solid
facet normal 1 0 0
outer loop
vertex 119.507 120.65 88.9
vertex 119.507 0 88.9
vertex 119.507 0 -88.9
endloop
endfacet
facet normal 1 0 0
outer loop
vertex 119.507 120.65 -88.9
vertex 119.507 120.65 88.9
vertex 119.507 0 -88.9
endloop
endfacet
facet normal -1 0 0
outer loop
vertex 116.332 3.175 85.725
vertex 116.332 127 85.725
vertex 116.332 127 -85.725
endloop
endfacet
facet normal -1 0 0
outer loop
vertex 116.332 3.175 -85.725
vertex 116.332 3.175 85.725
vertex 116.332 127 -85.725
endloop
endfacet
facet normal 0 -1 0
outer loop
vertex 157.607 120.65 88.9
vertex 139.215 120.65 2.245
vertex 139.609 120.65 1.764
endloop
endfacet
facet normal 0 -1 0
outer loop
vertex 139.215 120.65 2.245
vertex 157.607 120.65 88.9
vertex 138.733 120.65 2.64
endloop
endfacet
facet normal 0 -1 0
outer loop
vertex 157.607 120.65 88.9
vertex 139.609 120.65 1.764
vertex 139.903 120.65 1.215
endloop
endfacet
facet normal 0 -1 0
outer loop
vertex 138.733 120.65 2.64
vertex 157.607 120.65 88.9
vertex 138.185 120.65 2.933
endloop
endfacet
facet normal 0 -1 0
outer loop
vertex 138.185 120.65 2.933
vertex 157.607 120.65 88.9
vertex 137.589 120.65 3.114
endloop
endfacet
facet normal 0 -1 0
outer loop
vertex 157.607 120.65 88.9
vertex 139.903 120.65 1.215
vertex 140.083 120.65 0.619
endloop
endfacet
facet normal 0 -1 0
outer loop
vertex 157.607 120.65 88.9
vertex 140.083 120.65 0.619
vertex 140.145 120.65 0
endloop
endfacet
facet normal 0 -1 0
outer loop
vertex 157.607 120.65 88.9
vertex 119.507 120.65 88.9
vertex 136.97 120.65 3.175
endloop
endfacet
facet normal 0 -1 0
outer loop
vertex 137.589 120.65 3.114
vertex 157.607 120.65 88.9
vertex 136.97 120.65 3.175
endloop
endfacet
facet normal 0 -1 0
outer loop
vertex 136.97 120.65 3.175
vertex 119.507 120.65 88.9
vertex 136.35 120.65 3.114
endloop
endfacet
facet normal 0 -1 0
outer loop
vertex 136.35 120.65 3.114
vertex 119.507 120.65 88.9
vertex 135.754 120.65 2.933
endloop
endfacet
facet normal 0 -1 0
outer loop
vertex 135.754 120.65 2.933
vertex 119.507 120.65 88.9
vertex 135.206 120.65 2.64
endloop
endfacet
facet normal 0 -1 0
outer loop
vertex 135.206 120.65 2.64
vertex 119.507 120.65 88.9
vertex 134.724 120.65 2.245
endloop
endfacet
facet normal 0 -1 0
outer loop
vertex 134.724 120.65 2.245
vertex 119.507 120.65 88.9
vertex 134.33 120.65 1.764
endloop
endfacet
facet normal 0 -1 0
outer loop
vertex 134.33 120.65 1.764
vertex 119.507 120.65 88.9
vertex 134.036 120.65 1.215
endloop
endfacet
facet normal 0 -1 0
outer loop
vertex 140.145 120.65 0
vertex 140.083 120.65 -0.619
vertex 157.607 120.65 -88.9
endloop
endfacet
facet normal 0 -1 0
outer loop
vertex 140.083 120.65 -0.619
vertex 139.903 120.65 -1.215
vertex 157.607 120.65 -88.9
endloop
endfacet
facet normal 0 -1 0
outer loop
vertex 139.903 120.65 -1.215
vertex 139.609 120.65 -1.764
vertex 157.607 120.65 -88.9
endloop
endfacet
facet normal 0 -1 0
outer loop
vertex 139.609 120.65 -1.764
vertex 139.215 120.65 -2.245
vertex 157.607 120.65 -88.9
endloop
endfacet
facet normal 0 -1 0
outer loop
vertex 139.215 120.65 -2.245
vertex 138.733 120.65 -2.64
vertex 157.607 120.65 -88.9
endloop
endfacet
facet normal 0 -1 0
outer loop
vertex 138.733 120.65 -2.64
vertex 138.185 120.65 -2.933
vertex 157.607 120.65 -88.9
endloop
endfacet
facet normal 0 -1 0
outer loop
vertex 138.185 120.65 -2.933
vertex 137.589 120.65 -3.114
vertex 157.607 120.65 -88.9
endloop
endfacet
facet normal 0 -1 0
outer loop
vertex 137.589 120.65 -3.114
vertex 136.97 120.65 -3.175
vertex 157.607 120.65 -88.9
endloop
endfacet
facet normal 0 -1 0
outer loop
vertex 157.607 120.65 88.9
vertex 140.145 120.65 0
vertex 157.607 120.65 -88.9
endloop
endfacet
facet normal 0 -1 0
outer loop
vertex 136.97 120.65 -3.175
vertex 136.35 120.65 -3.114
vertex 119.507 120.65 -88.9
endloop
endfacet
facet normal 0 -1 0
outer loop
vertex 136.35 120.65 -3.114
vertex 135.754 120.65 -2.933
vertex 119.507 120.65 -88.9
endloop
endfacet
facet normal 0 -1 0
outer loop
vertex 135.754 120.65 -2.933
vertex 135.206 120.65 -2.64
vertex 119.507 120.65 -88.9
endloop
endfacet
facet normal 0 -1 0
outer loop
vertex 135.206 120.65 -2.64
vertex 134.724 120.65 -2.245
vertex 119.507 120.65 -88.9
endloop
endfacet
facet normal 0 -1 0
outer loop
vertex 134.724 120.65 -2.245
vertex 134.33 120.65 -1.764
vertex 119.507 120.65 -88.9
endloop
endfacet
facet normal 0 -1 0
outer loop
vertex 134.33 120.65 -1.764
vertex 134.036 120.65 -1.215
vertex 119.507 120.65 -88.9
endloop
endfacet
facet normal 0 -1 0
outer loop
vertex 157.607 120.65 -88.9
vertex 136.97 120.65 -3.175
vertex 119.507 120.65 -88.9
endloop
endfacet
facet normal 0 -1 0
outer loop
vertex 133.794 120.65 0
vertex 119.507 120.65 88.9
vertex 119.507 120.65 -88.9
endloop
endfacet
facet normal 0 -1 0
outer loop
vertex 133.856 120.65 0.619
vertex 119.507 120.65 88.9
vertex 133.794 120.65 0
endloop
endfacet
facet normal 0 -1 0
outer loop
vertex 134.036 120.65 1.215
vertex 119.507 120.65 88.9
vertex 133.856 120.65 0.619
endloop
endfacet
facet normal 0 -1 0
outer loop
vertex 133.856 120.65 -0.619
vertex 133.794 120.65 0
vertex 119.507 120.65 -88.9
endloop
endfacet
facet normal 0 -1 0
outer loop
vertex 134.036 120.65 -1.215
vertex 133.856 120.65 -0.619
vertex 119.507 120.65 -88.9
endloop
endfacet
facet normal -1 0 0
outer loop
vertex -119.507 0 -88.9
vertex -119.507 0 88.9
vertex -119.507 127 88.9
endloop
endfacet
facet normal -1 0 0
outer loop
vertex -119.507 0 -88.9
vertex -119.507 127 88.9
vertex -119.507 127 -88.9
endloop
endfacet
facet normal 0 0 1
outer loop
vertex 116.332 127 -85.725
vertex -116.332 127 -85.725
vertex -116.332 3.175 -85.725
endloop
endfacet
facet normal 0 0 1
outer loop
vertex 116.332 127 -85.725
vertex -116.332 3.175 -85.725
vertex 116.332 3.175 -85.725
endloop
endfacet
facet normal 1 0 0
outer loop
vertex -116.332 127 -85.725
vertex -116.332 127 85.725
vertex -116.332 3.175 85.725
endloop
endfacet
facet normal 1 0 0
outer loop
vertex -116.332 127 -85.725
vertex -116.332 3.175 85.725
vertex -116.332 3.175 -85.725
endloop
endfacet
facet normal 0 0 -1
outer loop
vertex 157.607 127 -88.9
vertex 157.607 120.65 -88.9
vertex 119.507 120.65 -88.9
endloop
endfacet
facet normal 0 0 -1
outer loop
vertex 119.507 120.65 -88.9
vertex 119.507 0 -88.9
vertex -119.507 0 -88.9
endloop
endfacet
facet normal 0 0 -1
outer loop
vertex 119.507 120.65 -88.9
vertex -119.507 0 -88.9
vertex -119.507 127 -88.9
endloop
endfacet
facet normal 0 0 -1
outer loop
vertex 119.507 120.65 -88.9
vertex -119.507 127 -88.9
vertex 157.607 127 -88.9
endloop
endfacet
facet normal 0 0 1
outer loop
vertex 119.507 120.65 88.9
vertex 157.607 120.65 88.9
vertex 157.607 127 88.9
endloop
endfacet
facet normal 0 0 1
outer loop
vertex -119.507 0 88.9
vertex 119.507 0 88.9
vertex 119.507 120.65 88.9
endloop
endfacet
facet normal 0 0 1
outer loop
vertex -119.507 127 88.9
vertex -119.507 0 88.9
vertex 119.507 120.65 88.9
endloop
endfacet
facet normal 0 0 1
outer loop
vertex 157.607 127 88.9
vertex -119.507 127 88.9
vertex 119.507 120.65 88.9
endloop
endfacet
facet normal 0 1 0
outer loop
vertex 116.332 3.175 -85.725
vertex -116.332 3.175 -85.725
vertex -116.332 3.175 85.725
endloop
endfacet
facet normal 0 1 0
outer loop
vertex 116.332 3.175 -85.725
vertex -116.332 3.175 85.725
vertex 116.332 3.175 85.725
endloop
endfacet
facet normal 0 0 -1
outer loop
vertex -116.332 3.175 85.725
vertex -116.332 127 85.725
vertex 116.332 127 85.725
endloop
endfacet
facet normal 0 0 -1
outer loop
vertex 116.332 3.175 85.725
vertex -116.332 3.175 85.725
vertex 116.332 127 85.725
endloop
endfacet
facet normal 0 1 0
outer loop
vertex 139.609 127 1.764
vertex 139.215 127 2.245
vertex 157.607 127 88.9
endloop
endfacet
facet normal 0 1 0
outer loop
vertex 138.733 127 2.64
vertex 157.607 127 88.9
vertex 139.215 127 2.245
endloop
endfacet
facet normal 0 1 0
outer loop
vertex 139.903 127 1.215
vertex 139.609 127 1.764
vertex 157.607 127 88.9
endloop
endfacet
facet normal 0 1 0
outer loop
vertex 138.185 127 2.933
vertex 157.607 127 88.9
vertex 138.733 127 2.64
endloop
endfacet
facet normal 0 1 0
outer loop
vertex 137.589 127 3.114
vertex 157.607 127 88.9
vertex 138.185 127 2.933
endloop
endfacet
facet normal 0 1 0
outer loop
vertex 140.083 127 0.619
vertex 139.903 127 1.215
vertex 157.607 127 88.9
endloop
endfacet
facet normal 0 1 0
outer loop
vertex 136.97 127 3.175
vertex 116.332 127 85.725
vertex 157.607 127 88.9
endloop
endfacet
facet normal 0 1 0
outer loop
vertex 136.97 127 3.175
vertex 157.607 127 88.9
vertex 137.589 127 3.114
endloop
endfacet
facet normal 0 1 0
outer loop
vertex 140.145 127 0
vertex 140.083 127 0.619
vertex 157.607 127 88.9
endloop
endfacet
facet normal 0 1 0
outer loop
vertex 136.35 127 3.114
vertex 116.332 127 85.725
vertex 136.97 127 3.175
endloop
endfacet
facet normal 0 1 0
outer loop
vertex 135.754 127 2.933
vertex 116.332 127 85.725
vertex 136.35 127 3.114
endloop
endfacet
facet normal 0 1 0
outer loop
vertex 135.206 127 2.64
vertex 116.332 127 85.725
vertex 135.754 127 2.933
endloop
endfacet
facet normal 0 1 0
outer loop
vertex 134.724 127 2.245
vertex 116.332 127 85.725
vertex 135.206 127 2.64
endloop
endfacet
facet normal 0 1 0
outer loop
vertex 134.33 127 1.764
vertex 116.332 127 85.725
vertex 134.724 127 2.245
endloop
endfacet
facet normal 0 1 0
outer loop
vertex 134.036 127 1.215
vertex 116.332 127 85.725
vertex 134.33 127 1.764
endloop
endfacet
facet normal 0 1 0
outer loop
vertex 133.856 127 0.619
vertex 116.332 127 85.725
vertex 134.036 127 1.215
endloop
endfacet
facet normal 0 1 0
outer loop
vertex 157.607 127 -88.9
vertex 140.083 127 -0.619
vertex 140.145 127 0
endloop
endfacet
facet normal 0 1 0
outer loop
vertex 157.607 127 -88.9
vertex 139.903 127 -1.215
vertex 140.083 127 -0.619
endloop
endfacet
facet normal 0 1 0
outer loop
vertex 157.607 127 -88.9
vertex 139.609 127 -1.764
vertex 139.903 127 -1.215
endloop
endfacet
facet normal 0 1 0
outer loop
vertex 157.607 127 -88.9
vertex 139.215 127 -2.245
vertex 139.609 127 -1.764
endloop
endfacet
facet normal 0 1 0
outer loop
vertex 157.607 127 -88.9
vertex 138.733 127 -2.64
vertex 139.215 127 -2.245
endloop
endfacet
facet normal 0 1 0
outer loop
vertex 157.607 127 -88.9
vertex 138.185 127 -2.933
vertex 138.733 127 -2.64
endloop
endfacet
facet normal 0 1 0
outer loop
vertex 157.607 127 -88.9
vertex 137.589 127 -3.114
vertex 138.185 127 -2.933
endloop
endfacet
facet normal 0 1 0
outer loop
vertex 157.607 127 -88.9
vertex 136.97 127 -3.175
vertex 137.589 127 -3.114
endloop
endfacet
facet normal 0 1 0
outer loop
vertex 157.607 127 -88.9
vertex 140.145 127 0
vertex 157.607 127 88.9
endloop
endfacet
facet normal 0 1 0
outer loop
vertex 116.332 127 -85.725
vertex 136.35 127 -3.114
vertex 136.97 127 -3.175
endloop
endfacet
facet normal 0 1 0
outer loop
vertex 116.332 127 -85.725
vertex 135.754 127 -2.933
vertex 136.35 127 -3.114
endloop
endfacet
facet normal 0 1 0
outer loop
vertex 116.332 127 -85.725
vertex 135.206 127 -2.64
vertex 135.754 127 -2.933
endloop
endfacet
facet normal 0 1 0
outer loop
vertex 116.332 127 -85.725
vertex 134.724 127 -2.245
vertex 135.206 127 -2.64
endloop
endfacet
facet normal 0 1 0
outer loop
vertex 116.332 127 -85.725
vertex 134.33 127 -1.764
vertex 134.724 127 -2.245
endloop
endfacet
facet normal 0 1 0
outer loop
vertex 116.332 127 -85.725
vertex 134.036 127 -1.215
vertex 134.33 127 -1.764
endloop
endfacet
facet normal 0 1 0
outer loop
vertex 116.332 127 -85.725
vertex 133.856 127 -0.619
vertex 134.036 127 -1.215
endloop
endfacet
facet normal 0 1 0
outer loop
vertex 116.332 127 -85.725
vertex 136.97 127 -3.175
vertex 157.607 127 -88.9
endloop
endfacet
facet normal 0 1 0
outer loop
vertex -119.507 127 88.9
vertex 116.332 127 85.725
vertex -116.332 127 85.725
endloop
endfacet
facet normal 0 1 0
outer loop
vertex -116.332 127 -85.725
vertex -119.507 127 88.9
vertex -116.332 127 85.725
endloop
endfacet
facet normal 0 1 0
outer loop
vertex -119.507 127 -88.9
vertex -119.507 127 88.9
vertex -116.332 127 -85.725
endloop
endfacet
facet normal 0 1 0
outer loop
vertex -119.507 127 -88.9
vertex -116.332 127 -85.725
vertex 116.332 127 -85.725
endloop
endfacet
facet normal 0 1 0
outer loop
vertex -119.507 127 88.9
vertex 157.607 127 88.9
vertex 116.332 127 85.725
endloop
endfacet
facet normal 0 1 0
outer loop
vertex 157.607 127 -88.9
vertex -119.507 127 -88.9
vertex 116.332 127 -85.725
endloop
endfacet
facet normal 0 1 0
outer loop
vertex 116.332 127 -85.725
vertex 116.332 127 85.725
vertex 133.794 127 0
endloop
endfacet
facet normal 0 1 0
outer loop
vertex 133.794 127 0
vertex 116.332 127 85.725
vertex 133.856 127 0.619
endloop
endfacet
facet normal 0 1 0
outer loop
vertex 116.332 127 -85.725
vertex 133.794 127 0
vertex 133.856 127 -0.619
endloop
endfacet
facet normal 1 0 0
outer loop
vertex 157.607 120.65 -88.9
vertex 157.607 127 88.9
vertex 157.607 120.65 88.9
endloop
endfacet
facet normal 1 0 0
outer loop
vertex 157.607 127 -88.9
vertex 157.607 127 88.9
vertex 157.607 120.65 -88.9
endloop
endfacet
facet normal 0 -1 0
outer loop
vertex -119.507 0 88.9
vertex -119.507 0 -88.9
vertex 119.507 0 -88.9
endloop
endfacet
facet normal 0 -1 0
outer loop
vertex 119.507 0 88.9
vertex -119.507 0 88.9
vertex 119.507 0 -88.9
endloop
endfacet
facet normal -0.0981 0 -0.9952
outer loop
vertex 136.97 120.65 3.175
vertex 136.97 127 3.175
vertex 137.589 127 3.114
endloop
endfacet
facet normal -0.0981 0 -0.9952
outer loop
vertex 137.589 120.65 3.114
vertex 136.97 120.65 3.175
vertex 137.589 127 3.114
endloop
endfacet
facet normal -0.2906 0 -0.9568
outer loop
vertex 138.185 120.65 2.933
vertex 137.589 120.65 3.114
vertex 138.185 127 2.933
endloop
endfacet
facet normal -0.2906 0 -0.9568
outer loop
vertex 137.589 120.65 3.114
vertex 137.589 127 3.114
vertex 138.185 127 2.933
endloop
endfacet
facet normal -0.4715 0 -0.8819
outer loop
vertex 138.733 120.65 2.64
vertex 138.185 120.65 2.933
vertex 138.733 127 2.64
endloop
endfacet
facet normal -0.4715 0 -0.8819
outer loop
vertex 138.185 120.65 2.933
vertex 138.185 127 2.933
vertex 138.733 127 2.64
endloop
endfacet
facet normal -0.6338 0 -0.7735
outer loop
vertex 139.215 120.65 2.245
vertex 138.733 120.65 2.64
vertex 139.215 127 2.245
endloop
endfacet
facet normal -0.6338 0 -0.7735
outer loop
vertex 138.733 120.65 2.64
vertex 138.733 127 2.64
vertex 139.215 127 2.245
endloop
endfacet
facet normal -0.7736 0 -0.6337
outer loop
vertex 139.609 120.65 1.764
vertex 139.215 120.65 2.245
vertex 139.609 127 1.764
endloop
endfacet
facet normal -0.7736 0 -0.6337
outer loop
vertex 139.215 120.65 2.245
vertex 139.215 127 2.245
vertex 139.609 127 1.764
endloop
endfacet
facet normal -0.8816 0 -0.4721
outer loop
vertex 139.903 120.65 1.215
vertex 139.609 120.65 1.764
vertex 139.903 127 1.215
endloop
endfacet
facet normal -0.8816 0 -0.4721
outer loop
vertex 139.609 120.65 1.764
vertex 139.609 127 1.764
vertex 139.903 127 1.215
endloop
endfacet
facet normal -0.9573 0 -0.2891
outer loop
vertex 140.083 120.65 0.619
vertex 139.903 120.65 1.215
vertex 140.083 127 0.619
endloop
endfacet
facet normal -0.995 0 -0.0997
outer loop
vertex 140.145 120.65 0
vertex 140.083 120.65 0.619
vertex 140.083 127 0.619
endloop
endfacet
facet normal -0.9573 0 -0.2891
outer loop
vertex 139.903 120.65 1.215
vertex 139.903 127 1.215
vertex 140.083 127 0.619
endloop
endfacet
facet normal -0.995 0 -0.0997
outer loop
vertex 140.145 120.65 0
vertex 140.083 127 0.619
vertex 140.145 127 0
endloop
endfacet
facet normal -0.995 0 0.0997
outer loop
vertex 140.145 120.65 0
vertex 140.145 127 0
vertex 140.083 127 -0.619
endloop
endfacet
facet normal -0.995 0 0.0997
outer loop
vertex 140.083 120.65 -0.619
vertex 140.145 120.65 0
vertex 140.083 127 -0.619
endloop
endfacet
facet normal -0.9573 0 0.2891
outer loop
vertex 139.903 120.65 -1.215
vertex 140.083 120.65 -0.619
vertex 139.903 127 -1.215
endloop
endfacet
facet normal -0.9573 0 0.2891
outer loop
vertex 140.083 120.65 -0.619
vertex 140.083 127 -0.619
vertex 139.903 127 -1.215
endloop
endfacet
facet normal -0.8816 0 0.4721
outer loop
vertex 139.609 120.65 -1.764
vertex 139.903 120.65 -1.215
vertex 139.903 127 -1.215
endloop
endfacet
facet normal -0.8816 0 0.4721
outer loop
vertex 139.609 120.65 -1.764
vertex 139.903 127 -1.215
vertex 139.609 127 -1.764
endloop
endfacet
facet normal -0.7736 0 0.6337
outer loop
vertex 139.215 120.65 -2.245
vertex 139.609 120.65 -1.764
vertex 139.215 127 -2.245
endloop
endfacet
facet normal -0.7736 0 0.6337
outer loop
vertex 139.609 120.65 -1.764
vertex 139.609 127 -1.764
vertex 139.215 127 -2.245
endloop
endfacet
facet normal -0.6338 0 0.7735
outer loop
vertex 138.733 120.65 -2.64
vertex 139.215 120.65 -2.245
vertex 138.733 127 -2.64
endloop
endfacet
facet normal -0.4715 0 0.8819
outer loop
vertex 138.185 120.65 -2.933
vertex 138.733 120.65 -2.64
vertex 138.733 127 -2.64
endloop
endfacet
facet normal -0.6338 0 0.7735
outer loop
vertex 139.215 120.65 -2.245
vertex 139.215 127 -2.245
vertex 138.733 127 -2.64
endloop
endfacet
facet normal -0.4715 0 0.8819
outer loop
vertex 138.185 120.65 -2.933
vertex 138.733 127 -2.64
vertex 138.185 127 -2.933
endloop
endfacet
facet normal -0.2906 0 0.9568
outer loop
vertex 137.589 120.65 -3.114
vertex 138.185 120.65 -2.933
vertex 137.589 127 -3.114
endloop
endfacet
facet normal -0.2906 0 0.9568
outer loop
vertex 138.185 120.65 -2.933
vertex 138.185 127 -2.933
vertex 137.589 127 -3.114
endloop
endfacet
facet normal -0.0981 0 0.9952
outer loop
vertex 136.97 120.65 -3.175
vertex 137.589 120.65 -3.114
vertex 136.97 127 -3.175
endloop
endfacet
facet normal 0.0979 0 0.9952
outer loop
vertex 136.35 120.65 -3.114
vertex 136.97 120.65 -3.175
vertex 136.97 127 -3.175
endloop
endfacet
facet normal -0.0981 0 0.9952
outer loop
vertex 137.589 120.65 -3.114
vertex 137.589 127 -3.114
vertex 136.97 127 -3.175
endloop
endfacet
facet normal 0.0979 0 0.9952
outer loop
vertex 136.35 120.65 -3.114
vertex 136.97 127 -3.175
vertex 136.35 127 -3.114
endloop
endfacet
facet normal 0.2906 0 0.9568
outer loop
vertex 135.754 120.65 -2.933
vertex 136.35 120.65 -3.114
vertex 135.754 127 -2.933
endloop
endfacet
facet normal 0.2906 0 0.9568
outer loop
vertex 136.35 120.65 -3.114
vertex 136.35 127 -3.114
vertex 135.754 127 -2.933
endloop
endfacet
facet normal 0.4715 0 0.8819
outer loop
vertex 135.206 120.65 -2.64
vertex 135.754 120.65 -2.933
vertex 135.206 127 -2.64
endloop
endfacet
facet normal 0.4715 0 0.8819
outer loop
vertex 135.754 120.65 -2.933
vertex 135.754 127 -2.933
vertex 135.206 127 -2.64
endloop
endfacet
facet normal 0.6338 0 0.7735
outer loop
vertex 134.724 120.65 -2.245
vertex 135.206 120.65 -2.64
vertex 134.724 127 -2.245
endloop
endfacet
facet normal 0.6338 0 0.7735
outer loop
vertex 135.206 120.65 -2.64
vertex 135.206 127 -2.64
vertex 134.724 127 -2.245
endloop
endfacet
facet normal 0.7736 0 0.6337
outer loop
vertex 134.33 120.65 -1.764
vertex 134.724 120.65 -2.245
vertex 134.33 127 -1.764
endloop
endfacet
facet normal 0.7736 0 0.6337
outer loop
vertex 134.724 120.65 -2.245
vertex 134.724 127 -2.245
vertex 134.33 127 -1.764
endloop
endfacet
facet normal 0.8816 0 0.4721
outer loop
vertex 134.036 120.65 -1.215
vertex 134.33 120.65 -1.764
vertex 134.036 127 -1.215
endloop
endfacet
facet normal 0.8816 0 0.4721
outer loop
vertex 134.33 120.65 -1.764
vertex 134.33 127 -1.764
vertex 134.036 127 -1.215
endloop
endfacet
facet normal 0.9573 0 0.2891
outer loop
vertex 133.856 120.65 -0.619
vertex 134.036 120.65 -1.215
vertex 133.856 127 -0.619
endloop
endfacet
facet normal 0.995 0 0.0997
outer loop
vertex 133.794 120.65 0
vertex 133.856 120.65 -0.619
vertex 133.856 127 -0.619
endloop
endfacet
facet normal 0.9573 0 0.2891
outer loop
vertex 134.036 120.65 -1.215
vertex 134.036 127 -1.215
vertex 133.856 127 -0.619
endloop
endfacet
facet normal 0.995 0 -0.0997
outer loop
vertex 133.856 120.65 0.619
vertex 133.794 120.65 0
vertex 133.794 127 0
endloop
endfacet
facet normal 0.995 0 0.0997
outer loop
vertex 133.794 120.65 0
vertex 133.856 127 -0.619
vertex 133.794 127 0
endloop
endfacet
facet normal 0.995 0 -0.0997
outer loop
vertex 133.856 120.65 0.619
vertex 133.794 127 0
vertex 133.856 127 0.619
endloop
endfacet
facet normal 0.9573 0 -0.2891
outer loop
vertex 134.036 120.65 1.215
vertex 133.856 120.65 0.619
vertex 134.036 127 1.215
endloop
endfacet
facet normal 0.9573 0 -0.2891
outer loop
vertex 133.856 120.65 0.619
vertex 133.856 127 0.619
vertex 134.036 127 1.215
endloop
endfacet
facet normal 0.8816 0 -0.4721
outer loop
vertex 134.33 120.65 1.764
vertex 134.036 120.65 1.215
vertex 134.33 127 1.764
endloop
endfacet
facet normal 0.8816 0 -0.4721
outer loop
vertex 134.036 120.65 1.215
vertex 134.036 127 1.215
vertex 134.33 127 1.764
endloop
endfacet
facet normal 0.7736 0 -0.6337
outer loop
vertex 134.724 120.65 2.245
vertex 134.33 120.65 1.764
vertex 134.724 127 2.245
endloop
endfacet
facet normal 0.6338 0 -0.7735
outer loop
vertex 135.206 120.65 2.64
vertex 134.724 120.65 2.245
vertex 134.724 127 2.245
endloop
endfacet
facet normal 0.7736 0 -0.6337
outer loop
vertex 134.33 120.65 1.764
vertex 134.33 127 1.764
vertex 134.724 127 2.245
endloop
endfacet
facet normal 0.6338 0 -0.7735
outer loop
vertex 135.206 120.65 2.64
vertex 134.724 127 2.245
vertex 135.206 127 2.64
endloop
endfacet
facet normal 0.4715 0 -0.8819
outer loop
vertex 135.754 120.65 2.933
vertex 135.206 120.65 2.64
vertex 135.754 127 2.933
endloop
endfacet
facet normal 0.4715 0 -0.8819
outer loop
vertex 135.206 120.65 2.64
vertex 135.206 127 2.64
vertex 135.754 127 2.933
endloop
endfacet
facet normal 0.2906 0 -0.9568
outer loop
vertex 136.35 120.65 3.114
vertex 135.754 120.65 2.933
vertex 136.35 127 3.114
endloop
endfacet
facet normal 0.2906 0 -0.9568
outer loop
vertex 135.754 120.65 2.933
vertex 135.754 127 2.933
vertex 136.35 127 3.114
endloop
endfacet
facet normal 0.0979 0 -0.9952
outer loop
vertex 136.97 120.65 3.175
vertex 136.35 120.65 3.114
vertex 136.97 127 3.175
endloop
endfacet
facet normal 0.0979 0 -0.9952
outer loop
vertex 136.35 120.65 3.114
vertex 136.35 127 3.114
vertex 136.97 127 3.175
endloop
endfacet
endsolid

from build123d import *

# Parameters (mm, degrees)
SKETCH1_W           = 239.014
SKETCH1_H           = 177.8
BOSS_EXTRUDE1_DEPTH = 127
SKETCH2_W           = 232.664
SKETCH2_H           = 171.45
CUT_EXTRUDE1_DEPTH  = 123.825
SKETCH3_W           = 177.8
SKETCH3_H           = 6.35
BOSS_EXTRUDE2_DEPTH = 38.1
SKETCH5_R           = 3.175
CUT_EXTRUDE2_DEPTH  = 6.35


with BuildPart() as part:
    # Sketch1 → Boss-Extrude1 (new body)
    with BuildSketch(Plane(origin=(0, 0, 0), x_dir=(1, 0, 0), z_dir=(0, 1, 0))):
        Rectangle(SKETCH1_W, SKETCH1_H)
    extrude(amount=BOSS_EXTRUDE1_DEPTH)

    # Sketch2 → Cut-Extrude1 (cut)
    with BuildSketch(Plane(origin=(0, 127, 0), x_dir=(1, 0, 0), z_dir=(0, 1, 0))):
        Rectangle(SKETCH2_W, SKETCH2_H)
    extrude(amount=-CUT_EXTRUDE1_DEPTH, mode=Mode.SUBTRACT)

    # Sketch3 → Boss-Extrude2 (add)
    with BuildSketch(Plane(origin=(119.507, 0, 0), x_dir=(0, 0, -1), z_dir=(1, 0, 0))):
        with Locations((0, 123.825)):
            Rectangle(SKETCH3_W, SKETCH3_H)
    extrude(amount=BOSS_EXTRUDE2_DEPTH)

    # Sketch5 → Cut-Extrude2 (cut)
    with BuildSketch(Plane(origin=(0, 127, 0), x_dir=(1, 0, 0), z_dir=(0, 1, 0))):
        with Locations(Location((136.9695, 0, 0), (0, 0, 270))):
            Circle(SKETCH5_R)
    extrude(amount=-CUT_EXTRUDE2_DEPTH, mode=Mode.SUBTRACT)


solid = part.part
